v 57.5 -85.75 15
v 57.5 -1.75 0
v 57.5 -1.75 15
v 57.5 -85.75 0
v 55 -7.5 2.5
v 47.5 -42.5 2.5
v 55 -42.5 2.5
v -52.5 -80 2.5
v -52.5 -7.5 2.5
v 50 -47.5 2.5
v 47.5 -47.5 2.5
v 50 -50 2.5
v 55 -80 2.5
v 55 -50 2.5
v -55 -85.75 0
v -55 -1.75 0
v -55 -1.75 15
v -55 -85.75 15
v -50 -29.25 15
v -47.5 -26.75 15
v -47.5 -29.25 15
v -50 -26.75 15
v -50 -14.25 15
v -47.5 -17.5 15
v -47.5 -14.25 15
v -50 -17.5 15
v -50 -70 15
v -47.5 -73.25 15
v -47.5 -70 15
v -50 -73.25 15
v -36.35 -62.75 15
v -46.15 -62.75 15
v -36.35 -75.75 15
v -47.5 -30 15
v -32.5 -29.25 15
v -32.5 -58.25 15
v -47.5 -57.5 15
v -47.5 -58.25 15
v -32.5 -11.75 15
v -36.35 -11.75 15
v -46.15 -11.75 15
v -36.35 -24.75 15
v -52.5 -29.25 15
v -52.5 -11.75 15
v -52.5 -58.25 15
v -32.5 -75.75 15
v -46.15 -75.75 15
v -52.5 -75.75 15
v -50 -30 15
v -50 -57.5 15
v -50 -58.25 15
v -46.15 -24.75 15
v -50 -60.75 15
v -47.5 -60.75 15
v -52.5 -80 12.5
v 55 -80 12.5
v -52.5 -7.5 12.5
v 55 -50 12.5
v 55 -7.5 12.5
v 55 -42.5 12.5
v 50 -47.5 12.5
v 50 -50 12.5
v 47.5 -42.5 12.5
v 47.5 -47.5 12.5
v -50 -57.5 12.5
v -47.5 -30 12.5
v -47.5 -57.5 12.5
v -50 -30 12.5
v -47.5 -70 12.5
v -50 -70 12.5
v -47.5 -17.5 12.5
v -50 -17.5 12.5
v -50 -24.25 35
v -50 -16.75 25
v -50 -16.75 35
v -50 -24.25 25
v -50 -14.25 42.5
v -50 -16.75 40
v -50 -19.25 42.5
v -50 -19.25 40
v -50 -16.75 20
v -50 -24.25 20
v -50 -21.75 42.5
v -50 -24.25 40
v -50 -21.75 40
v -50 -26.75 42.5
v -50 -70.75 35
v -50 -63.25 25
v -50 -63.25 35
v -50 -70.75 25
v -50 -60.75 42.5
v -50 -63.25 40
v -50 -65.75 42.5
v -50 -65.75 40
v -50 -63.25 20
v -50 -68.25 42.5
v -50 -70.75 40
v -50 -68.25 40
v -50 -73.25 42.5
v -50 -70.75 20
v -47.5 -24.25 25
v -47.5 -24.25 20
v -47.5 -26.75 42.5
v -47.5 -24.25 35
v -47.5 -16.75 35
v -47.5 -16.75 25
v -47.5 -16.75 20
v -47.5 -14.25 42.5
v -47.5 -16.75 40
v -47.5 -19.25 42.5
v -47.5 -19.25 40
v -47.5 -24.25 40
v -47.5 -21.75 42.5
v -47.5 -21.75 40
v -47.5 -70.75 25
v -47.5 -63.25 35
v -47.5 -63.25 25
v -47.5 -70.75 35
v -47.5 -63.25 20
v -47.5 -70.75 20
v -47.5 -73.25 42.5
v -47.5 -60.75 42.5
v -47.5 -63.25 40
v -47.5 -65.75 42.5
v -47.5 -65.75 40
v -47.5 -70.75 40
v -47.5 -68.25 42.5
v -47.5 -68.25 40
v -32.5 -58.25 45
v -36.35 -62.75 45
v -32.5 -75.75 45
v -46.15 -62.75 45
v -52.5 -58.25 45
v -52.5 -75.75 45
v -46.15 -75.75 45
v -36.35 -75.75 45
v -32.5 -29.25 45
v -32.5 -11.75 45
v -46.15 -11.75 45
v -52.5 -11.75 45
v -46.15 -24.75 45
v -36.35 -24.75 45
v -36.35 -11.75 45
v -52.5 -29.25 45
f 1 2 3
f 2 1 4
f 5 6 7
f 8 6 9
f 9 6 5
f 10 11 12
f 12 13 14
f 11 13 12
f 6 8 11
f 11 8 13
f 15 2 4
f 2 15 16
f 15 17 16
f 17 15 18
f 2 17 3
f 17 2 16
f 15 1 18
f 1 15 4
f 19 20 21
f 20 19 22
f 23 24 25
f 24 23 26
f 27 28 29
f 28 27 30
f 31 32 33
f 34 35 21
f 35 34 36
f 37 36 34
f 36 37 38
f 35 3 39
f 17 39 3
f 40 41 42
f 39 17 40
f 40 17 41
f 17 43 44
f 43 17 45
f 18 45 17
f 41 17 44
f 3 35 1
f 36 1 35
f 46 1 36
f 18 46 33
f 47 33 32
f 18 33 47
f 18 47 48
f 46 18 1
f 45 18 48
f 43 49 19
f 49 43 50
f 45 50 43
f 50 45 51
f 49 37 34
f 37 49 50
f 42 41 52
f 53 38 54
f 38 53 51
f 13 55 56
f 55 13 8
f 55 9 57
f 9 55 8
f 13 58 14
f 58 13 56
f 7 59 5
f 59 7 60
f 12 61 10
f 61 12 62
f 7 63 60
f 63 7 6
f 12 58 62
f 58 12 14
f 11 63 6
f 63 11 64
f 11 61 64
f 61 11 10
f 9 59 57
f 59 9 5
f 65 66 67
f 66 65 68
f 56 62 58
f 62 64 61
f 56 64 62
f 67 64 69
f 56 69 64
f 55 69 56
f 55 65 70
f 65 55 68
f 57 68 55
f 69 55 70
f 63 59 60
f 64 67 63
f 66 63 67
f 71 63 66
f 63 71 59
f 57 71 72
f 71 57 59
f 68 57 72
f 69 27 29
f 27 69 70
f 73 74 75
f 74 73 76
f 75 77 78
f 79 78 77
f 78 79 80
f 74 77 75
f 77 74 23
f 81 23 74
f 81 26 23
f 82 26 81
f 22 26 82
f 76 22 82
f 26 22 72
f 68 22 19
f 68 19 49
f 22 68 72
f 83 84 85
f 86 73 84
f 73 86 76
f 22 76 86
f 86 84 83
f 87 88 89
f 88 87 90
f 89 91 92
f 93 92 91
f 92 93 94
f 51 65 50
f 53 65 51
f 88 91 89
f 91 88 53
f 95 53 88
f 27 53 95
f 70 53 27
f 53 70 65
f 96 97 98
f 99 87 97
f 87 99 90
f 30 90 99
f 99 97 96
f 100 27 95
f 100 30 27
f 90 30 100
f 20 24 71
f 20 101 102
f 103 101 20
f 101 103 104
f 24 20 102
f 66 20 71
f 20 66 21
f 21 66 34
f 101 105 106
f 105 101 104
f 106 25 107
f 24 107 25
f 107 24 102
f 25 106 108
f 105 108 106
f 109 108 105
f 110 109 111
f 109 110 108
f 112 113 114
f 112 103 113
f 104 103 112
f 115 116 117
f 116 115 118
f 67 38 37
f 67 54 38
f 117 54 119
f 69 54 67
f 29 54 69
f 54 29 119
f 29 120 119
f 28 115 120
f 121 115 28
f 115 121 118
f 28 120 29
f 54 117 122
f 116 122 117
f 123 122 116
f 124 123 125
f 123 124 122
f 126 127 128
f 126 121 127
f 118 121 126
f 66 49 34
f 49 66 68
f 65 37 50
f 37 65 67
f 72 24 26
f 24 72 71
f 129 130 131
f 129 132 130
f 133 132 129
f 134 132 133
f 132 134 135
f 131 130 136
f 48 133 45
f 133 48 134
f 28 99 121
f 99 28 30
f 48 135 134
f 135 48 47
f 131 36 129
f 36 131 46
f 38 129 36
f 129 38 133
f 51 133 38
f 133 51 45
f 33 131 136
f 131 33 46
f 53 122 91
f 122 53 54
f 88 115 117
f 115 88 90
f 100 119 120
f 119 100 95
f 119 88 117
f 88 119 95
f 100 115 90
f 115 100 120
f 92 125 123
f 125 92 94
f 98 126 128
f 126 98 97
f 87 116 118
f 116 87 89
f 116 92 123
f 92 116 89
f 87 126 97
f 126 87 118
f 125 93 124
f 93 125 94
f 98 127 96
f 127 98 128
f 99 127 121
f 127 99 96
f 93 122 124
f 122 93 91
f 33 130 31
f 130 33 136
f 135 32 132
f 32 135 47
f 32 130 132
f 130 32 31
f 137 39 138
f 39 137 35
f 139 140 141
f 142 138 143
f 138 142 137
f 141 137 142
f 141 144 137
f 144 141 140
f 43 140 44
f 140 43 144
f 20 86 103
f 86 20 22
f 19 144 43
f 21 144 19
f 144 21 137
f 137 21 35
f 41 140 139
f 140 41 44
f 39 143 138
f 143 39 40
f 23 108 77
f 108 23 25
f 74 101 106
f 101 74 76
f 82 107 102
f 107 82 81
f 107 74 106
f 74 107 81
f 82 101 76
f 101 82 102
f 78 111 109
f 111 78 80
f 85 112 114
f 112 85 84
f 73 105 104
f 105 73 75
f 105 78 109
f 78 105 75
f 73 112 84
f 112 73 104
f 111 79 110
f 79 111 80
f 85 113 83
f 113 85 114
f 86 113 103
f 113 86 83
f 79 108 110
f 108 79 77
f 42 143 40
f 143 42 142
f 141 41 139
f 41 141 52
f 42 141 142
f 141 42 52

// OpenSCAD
// Parametric cube-mesh reconstruction from base_voxels.scad (merged cubes, not voxels)
pitch = 2.5;

// tower_spacing is measured between the *inner edges* of the rectangular holes
// (i.e., from the hole face closest to the center gap on tower A to the corresponding face on tower B).
// Increasing tower_spacing also lengthens the base in the tower_dir direction.
tower_dir = [0, 1, 0];                 // direction from tower0 -> tower1
hole_dims = [9.8, 13.5, 35];           // (x,y,z) size of the cutout inside each tower
hole_offset = [0,0,0];                 // additional offset applied to the hole center (world axes)

// --- derived constants from the original imported geometry ---
base_gap_hole_centers = 45.0;          // original (tower1 hole center Y - tower0 hole center Y), along tower_dir
orig_hole_edge_spacing = base_gap_hole_centers - hole_dims[1];

// user-facing parameter (inner-edge-to-inner-edge spacing)
tower_spacing = 38;//orig_hole_edge_spacing;

base_boxes = [
  [-55, -82.5, 0, 112.5, 77.5, 2.5],
  [-55, -82.5, 2.5, 112.5, 2.5, 12.5],
  [-55, -80, 2.5, 2.5, 75, 12.5],
  [55, -80, 2.5, 2.5, 75, 12.5],
  [50, -50, 2.5, 5, 7.5, 12.5],
  [47.5, -47.5, 2.5, 2.5, 5, 12.5],
  [-52.5, -7.5, 2.5, 107.5, 2.5, 12.5],
  [-52.5, -80, 12.5, 107.5, 10, 2.5],
  [-52.5, -70, 12.5, 2.5, 62.5, 2.5],
  [-47.5, -70, 12.5, 102.5, 20, 2.5],
  [-50, -57.5, 12.5, 2.5, 27.5, 2.5],
  [-47.5, -50, 12.5, 97.5, 2.5, 2.5],
  [-47.5, -47.5, 12.5, 95, 40, 2.5],
  [47.5, -42.5, 12.5, 7.5, 35, 2.5],
  [-50, -17.5, 12.5, 2.5, 10, 2.5],
];
orig_base_min_y = -82.5;
orig_base_max_y = -5.0;
eps = 0.01;

// Extend base boxes along tower_dir (Y) when tower spacing increases.
// Boxes that touch the original min/max Y get extended by half on that side.
// Boxes that touch both ends get extended by the full amount.
function extend_base_box(b, ext) =
    let(y0=b[1], dy=b[4], y1=y0+dy,
        touch_min = abs(y0 - orig_base_min_y) < eps,
        touch_max = abs(y1 - orig_base_max_y) < eps)
    touch_min && touch_max ? [b[0], y0 - ext/2, b[2], b[3], dy + ext,   b[5]] :
    touch_min            ? [b[0], y0 - ext/2, b[2], b[3], dy + ext/2, b[5]] :
    touch_max            ? [b[0], y0,         b[2], b[3], dy + ext/2, b[5]] :
                             b;

tower0_boxes = [
  [-52.5, -72.5, 15, 7.5, 2.5, 30],
  [-37.5, -72.5, 15, 5, 17.5, 30],
  [-52.5, -70, 15, 2.5, 15, 30],
  [-47.5, -70, 15, 2.5, 15, 30],
  [-45, -60, 15, 7.5, 5, 30],
  [-50, -57.5, 15, 2.5, 2.5, 30],
  [-50, -67.5, 20, 2.5, 7.5, 5],
  [-50, -67.5, 35, 2.5, 7.5, 5],
  [-50, -65, 40, 2.5, 2.5, 5],
  [-50, -70, 42.5, 2.5, 5, 2.5],
  [-50, -62.5, 42.5, 2.5, 5, 2.5],
];
tower1_boxes = [
  [-52.5, -32.5, 15, 20, 2.5, 30],
  [-52.5, -30, 15, 2.5, 15, 30],
  [-47.5, -30, 15, 15, 2.5, 30],
  [-47.5, -27.5, 15, 2.5, 12.5, 30],
  [-37.5, -27.5, 15, 5, 12.5, 30],
  [-50, -17.5, 15, 2.5, 2.5, 30],
  [-50, -27.5, 20, 2.5, 7.5, 5],
  [-50, -27.5, 35, 2.5, 7.5, 5],
  [-50, -25, 40, 2.5, 2.5, 5],
  [-50, -30, 42.5, 2.5, 5, 2.5],
  [-50, -22.5, 42.5, 2.5, 5, 2.5],
];
tower0_center = [-42.417, -62.750, 30.178];
tower1_center = [-42.417, -24.750, 30.178];
tower0_hole_rel = [1.167, -3.500, 0.000];
tower1_hole_rel = [1.167, 3.500, 0.000];


module draw_boxes(B) {
  for (b = B) {
    translate([b[0], b[1], b[2]]) cube([b[3], b[4], b[5]], center=false);
  }
}

module tower(B, tower_center, hole_rel) {
  difference() {
    draw_boxes(B);
    translate(tower_center + hole_rel + hole_offset)
      cube(hole_dims, center=true);
  }
}

module model() {
  // Compute how much to separate the towers (and extend the base) to achieve the requested
  // inner-edge-to-inner-edge hole spacing.
  sep_needed = (tower_spacing + hole_dims[1]) - base_gap_hole_centers;  // additional separation between hole centers
  shift_amt = sep_needed / 2;
  shift = [tower_dir[0]*shift_amt, tower_dir[1]*shift_amt, tower_dir[2]*shift_amt];

  // Extend the base along Y by the same total additional separation (sep_needed).
  base_boxes_ext = [for (b = base_boxes) extend_base_box(b, sep_needed)];
  draw_boxes(base_boxes_ext);


  translate(-shift) tower(tower0_boxes, tower0_center, tower0_hole_rel);
  translate( shift) tower(tower1_boxes, tower1_center, tower1_hole_rel);
}

model();
